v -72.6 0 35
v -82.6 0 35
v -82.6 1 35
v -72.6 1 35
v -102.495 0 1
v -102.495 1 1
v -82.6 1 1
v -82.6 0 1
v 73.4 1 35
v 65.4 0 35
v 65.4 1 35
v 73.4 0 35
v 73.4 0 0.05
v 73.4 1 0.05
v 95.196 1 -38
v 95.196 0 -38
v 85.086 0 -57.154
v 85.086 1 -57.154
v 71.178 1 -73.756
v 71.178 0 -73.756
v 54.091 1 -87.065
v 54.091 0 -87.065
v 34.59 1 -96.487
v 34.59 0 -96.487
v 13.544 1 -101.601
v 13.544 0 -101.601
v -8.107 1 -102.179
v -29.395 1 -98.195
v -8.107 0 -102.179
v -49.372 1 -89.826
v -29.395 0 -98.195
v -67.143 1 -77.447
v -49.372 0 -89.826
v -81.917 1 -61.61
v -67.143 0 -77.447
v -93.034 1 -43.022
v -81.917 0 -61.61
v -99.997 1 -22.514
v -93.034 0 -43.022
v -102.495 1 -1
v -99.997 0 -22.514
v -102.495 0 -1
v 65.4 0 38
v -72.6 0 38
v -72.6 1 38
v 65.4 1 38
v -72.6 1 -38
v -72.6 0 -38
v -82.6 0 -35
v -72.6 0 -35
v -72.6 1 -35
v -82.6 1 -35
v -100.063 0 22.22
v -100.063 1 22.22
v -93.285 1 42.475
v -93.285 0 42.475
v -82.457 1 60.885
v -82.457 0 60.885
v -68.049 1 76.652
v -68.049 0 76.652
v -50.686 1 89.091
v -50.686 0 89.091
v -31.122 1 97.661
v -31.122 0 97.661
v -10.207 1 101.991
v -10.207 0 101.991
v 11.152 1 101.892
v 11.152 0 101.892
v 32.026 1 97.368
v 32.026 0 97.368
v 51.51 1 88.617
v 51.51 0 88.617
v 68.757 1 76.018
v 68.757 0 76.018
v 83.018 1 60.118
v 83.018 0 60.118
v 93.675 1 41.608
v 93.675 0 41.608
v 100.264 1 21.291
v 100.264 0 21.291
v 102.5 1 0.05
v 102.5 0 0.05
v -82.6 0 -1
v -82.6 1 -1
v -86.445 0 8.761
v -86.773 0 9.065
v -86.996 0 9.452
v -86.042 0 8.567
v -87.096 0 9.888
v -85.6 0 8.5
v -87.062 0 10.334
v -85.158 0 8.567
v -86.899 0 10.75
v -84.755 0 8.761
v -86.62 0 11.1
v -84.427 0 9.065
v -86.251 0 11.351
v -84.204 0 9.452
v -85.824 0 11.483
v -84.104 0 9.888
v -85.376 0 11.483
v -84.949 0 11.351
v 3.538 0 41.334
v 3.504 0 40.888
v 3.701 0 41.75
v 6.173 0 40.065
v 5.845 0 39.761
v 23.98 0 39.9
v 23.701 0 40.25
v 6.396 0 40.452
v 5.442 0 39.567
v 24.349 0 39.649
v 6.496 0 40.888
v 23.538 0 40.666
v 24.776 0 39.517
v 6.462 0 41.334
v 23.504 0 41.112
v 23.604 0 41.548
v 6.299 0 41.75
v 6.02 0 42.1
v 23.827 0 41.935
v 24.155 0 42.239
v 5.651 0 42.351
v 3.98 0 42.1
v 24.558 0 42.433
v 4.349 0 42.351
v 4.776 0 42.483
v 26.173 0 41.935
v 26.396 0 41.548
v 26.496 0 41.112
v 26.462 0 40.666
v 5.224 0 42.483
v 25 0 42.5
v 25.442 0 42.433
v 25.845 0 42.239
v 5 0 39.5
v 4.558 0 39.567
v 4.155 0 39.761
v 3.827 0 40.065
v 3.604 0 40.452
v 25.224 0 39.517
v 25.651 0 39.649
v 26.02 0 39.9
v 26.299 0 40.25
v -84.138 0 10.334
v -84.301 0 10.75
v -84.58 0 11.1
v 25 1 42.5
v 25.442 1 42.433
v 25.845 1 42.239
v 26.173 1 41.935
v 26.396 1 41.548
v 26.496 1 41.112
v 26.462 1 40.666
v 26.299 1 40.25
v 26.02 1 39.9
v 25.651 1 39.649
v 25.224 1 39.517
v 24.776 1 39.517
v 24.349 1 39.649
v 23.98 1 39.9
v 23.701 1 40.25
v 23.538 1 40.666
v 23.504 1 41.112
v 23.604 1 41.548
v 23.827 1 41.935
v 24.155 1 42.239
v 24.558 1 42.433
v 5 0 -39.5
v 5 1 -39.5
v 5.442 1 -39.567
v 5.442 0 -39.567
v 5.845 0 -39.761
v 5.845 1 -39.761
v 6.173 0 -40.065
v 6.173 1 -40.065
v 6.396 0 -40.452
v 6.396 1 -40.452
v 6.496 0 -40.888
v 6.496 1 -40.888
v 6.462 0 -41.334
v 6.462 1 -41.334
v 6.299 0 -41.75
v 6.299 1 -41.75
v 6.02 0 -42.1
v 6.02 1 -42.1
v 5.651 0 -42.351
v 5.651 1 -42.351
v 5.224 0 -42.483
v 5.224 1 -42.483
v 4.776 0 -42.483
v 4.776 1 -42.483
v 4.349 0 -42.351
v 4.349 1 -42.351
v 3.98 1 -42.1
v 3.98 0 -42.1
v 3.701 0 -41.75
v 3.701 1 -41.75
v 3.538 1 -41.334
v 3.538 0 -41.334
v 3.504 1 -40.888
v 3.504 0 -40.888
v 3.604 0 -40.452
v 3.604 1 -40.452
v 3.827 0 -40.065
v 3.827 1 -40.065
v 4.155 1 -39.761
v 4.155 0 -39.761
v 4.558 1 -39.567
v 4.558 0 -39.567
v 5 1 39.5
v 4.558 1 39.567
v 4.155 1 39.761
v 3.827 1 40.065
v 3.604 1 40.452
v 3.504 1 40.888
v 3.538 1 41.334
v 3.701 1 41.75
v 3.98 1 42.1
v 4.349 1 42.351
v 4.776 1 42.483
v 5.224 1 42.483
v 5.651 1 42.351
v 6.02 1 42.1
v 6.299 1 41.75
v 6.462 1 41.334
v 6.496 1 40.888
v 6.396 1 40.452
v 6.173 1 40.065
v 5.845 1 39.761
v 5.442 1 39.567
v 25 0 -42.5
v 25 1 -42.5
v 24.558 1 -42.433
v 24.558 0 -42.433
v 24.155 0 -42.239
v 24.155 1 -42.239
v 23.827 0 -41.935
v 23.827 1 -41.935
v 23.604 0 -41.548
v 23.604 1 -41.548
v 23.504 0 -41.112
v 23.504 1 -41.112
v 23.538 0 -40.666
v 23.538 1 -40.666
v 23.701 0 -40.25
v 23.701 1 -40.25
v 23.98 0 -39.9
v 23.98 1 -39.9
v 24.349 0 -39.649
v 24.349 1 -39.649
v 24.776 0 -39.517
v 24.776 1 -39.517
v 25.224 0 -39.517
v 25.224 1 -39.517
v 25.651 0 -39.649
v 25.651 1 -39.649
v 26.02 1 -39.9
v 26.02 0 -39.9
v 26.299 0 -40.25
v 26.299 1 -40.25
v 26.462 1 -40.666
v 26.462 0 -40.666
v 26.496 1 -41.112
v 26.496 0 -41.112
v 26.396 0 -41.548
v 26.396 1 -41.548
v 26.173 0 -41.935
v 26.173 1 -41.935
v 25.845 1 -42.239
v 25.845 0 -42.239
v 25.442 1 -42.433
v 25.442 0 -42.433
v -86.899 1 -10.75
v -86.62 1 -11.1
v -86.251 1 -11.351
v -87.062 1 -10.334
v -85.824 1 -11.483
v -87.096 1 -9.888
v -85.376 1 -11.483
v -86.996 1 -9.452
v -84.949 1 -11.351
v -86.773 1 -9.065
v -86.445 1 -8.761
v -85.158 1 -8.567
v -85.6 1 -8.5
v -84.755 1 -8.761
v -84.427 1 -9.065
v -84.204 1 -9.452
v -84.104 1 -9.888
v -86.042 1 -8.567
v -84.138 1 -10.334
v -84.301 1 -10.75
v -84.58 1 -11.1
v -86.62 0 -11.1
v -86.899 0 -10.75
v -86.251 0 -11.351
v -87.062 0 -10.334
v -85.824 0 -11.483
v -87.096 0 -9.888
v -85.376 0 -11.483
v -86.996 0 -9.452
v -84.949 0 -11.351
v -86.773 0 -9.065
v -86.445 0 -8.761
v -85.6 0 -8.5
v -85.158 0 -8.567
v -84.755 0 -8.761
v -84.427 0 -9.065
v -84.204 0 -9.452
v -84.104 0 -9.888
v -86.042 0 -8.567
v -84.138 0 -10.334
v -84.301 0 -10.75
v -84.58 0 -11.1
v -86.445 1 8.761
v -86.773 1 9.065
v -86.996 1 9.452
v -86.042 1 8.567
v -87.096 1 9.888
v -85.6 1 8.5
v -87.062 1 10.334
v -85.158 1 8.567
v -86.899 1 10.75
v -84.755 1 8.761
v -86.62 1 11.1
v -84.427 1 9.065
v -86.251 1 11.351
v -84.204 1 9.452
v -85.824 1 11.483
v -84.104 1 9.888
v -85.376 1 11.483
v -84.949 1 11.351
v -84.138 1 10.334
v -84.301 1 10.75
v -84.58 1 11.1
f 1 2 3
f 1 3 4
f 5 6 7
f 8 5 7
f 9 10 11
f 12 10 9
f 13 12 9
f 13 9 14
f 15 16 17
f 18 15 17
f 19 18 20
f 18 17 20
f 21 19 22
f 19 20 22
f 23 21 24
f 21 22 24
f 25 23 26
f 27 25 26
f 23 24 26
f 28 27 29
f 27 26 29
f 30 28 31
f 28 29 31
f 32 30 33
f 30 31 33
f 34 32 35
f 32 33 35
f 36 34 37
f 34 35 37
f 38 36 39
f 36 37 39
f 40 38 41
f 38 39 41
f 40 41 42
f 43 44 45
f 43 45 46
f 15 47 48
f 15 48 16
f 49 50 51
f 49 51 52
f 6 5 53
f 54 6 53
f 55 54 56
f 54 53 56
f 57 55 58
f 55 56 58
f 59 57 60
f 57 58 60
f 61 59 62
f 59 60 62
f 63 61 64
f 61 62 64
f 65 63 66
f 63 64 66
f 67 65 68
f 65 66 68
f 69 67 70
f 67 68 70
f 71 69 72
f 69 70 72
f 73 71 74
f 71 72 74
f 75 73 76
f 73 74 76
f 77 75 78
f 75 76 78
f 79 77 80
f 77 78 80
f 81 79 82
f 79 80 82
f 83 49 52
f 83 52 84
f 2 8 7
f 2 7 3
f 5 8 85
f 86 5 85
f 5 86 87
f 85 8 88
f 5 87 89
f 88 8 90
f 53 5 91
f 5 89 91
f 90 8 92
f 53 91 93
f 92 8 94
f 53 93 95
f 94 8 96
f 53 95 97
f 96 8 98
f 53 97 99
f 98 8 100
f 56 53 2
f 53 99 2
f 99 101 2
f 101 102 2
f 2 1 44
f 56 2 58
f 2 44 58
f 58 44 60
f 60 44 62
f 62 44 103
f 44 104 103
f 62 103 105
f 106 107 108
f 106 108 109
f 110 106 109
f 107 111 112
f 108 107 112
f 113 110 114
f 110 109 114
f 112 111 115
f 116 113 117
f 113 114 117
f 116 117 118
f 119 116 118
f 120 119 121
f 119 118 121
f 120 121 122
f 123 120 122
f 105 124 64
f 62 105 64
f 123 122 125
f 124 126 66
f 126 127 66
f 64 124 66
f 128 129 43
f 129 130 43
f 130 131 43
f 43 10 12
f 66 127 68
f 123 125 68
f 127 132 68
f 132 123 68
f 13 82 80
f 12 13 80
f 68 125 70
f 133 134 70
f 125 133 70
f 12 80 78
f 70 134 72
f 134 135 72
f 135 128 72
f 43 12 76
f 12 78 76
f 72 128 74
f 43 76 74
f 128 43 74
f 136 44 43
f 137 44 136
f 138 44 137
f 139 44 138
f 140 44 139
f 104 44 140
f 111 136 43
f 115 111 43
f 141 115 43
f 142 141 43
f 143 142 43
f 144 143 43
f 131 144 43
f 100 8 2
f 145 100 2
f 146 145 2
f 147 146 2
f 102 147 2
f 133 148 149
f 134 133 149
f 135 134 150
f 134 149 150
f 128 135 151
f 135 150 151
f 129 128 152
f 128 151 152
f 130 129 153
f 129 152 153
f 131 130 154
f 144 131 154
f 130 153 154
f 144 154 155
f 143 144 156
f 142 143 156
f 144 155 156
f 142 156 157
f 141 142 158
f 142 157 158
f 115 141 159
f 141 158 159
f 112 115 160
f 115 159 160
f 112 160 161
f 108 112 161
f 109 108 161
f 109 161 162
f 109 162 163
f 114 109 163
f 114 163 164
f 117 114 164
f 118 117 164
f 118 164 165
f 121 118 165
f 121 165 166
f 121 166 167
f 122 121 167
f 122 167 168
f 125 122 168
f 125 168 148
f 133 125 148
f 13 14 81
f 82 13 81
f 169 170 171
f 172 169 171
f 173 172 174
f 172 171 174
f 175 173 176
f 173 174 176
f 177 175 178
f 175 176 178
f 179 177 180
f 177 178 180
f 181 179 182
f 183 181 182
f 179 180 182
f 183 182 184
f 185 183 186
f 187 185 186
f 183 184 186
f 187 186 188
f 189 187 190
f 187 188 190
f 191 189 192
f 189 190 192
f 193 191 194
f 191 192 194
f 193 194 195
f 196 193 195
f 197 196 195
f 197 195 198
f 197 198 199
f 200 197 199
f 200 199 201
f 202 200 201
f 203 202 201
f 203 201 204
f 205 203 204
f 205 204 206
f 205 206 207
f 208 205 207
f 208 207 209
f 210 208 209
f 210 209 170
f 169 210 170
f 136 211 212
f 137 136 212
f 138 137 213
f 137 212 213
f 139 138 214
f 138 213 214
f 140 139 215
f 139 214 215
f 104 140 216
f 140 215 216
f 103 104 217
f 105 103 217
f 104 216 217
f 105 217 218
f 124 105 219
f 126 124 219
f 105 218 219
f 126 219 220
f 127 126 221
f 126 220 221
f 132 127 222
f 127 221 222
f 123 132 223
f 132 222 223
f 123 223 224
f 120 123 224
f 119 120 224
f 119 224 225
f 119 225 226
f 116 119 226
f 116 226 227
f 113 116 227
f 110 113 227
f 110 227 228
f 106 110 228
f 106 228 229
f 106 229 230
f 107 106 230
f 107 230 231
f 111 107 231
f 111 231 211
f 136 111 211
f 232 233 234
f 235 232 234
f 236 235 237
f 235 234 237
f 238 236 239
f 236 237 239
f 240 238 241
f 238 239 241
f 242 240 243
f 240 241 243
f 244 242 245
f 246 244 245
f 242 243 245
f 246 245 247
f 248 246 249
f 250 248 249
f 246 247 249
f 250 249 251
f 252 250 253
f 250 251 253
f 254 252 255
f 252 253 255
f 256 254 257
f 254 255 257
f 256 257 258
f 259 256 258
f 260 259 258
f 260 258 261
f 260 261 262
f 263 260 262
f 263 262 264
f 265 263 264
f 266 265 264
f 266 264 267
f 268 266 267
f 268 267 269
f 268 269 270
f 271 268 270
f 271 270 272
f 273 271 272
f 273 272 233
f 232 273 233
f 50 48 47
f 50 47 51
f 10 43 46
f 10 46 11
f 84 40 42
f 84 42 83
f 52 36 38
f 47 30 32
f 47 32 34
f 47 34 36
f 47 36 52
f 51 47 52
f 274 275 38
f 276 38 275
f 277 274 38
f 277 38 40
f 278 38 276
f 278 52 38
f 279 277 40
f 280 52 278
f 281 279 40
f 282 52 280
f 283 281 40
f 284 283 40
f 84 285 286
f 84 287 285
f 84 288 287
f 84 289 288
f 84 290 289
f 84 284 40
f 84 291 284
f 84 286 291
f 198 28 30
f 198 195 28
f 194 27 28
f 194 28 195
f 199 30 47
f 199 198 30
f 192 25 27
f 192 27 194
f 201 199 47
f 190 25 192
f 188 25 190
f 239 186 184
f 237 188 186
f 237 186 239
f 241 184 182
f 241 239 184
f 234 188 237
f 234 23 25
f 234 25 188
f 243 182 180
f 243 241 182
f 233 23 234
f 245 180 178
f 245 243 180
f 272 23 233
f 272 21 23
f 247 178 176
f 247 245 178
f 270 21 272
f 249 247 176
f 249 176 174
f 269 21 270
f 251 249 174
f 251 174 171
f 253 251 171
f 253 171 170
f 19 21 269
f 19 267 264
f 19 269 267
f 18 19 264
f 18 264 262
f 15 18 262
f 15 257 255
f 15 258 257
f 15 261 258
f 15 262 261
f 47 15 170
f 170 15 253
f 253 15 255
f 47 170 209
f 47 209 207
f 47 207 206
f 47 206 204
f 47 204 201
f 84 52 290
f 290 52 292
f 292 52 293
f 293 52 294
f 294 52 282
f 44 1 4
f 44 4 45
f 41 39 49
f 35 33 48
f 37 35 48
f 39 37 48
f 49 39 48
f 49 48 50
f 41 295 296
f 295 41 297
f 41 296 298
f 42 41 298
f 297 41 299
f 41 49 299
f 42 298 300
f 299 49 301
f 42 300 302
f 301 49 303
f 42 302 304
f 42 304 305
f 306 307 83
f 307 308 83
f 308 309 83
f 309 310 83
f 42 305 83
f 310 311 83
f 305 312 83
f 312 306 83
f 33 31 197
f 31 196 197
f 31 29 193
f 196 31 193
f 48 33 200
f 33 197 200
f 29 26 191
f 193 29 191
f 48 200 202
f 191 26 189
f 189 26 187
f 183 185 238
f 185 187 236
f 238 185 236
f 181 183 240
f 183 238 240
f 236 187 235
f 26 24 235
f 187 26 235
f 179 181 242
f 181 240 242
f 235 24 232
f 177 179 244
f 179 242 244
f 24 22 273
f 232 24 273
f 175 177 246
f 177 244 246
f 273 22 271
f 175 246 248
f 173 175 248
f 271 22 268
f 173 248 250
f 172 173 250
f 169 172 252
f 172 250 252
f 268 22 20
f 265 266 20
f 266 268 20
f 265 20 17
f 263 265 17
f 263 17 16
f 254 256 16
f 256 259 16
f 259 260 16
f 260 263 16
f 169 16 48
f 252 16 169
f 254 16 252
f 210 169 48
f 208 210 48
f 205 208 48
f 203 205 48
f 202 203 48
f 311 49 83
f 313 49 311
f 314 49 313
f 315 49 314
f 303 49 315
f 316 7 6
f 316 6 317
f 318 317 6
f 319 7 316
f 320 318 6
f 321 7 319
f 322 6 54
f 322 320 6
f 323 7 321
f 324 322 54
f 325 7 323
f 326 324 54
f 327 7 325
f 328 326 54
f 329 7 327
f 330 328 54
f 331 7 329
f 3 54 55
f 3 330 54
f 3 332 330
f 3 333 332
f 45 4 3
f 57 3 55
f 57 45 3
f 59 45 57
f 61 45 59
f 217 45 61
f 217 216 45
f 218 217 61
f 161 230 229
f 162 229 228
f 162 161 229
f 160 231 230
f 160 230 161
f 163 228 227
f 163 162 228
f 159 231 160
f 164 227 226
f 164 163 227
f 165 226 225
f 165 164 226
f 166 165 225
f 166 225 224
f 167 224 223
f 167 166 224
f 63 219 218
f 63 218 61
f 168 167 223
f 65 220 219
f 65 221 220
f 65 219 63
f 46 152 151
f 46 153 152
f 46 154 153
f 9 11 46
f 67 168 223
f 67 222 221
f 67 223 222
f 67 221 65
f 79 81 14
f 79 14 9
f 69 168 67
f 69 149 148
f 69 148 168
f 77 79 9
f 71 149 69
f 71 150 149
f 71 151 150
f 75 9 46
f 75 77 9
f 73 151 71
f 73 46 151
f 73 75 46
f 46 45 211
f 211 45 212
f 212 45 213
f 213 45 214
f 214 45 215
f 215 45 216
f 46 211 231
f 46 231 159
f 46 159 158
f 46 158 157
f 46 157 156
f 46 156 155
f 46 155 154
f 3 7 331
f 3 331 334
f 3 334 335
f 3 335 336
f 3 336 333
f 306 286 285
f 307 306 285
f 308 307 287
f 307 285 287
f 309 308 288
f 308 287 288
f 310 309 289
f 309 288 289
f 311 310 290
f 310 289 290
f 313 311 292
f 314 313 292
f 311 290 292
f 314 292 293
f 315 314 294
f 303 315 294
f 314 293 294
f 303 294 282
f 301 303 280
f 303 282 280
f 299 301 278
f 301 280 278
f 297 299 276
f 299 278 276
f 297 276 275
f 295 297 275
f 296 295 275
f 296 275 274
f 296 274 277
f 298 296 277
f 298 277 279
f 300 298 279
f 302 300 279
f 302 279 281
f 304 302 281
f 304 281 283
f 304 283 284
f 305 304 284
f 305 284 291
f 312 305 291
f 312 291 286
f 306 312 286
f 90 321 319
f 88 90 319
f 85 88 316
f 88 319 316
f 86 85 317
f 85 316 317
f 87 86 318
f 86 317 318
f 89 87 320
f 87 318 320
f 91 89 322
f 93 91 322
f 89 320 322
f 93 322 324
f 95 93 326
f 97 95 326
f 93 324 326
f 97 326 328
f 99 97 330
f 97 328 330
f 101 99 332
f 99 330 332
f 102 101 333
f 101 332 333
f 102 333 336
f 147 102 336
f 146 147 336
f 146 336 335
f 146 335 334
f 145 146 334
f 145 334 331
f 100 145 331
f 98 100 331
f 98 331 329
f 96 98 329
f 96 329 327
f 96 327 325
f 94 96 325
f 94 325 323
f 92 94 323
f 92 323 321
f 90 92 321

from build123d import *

# Parameters (mm, degrees)
SKETCH_1_R          = 102.5
EXTRUDE_1_DEPTH     = 1
SKETCH_2_W          = 47.933731137
SKETCH_2_H          = 0.1
SKETCH_2_W_2        = 106.787277248
SKETCH_2_H_2        = 2
CUT_EXTRUDE_1_DEPTH = 145.960339404
SKETCH_5_W          = 37.099987805
SKETCH_5_H          = 37.95
CUT_EXTRUDE_4_DEPTH = 145.960330781
SKETCH_6_R          = 1.5
CUT_EXTRUDE_5_DEPTH = 145.960330781


with BuildPart() as part:
    # 草图1 → 凸台-拉伸1 (new body)
    with BuildSketch(Plane(origin=(0, 0, 0), x_dir=(1, 0, 0), z_dir=(0, 1, 0))):
        with Locations(Location((0, 0, 0), (0, 0, 270))):
            Circle(SKETCH_1_R)
        Polygon((-82.6, 35), (-82.6, -35), (-72.6, -35), (-72.6, -38), (65.4, -38), (65.4, -35), (73.4, -35), (73.4, 35), (65.4, 35), (65.4, 38), (-72.6, 38), (-72.6, 35), align=None, mode=Mode.SUBTRACT)
    extrude(amount=EXTRUDE_1_DEPTH)

    # 草图2 → 切除-拉伸1 (cut, through all)
    with BuildSketch(Plane(origin=(0, 1, 0), x_dir=(1, 0, 0), z_dir=(0, 1, 0))):
        with Locations((97.366865569, 0)):
            Rectangle(SKETCH_2_W, SKETCH_2_H)
        with Locations((-135.993638624, 0)):
            Rectangle(SKETCH_2_W_2, SKETCH_2_H_2)
    extrude(amount=-CUT_EXTRUDE_1_DEPTH, mode=Mode.SUBTRACT)


with BuildPart() as cut_extrude_1_piece_1:
    # of the separate pieces the step leaves, piece 1, a body of its own (cut_extrude_1_pieces)
    add(part.part.solids().sort_by_distance((-102.495121835, 0, 1))[0])


with BuildPart() as cut_extrude_1_piece_2:
    # of the separate pieces the step leaves, piece 2, a body of its own (cut_extrude_1_pieces)
    add(part.part.solids().sort_by_distance((102.499987805, 0, -0.05))[0])

    # 草图5 → 切除-拉伸4 (cut, through all)
    with BuildSketch(Plane(origin=(0, 1, 0), x_dir=(1, 0, 0), z_dir=(0, 1, 0))):
        with Locations((83.949993903, 19.025)):
            Rectangle(SKETCH_5_W, SKETCH_5_H)
    extrude(amount=-CUT_EXTRUDE_4_DEPTH, mode=Mode.SUBTRACT)


with BuildPart() as cut_extrude_5_tool:
    # 草图6 → 切除-拉伸5 (new, through all)
    with BuildSketch(Plane(origin=(0, 1, 0), x_dir=(1, 0, 0), z_dir=(0, 1, 0))):
        with Locations(Location((5, 41, 0), (0, 0, 270))):
            Circle(SKETCH_6_R)
        with Locations(Location((25, 41, 0), (0, 0, 90))):
            Circle(SKETCH_6_R)
        with Locations(Location((25, -41, 0), (0, 0, 270))):
            Circle(SKETCH_6_R)
        with Locations(Location((5, -41, 0), (0, 0, 90))):
            Circle(SKETCH_6_R)
        with Locations(Location((-85.6, 10, 0), (0, 0, 270))):
            Circle(SKETCH_6_R)
        with Locations(Location((-85.6, -10, 0), (0, 0, 90))):
            Circle(SKETCH_6_R)
    extrude(amount=-CUT_EXTRUDE_5_DEPTH)


with BuildPart() as cut_extrude_1_piece_1_1:
    add(cut_extrude_1_piece_1.part)

    # 切除-拉伸5: cut by cut_extrude_5_tool
    add(cut_extrude_5_tool.part, mode=Mode.SUBTRACT)


with BuildPart() as cut_extrude_1_piece_2_1:
    add(cut_extrude_1_piece_2.part)

    # 切除-拉伸5: cut by cut_extrude_5_tool
    add(cut_extrude_5_tool.part, mode=Mode.SUBTRACT)


solid = Compound([cut_extrude_1_piece_1_1.part, cut_extrude_1_piece_2_1.part])
